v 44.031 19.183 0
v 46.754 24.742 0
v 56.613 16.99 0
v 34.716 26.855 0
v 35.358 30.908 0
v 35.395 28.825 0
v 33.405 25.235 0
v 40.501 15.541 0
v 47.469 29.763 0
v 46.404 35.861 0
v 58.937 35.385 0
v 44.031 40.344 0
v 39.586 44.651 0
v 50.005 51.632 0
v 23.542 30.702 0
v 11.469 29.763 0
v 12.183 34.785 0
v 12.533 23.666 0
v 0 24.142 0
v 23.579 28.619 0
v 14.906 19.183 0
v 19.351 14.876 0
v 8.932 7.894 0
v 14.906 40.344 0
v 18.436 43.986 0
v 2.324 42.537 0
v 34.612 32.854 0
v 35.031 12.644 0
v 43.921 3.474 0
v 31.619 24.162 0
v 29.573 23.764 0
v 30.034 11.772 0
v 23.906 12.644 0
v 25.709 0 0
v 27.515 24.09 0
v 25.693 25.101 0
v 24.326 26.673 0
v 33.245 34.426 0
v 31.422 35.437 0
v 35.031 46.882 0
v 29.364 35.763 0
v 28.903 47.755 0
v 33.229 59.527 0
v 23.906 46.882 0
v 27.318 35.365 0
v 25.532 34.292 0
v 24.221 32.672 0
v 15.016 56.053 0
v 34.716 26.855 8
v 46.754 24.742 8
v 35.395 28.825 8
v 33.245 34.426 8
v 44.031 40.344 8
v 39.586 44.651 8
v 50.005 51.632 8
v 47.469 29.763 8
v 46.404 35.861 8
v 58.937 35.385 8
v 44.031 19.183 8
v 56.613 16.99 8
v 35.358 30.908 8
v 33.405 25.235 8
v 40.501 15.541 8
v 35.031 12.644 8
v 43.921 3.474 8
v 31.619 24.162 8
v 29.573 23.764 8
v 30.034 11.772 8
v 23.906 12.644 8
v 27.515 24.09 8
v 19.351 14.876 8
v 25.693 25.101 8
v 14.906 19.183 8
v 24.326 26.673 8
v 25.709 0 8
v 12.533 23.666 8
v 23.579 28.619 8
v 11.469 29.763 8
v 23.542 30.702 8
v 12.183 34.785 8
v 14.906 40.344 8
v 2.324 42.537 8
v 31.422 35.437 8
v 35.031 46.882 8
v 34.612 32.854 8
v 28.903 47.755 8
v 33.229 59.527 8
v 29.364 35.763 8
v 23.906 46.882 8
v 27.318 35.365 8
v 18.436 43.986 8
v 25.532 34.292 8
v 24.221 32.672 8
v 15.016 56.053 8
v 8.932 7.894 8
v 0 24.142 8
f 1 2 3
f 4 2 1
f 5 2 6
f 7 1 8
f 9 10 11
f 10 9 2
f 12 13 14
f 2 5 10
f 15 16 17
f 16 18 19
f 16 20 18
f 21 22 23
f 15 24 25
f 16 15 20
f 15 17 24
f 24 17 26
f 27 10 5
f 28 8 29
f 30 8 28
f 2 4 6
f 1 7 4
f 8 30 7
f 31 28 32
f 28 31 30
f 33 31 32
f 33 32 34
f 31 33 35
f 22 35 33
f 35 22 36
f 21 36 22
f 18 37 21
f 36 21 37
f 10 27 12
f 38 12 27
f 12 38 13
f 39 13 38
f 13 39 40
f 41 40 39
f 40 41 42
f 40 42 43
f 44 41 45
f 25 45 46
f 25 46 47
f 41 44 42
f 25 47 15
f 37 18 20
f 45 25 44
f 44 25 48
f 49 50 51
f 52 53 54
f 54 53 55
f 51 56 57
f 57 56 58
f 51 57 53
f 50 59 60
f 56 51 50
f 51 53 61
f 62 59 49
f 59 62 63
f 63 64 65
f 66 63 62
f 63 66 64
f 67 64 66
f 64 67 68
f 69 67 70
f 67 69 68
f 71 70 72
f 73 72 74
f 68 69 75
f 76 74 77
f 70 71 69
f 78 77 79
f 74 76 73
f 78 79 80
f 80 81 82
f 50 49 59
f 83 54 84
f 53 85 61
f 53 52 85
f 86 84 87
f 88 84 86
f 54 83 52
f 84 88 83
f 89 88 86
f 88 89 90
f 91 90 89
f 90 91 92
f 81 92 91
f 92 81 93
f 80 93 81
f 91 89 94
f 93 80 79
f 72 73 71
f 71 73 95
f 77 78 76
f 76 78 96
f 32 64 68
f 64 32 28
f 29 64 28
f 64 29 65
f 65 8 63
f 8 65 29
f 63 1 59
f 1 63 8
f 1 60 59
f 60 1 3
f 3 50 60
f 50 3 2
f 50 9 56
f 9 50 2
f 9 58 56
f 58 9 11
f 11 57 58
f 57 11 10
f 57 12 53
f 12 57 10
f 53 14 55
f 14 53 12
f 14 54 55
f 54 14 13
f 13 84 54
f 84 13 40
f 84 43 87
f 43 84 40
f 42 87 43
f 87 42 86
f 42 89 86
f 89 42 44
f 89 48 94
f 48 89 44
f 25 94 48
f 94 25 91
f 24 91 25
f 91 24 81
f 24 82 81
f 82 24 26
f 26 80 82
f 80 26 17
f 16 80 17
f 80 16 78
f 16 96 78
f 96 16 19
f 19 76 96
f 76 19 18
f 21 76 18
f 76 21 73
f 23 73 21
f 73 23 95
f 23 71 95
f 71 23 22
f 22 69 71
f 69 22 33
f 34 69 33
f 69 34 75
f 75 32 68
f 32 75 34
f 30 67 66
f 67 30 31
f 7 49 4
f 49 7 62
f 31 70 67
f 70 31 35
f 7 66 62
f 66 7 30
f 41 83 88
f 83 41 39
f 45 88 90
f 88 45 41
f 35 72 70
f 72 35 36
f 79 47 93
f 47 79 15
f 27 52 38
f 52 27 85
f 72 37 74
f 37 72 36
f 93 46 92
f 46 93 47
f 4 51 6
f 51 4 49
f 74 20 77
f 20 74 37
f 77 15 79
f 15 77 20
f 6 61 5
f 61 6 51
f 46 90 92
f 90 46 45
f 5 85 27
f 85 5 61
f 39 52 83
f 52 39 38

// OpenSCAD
$fn = 32;

// ----------------------------------------------------------------------
// Star wheel: 10-point ratchet, R30
// ----------------------------------------------------------------------

// --- parameters (mm) ---
n_points = 10;            // number of points / teeth
r_out = 30;               // tip radius
r_in = 18;                // root radius
bore_r = 6;               // centre bore radius
plate_t = 8;              // plate thickness, Z (extrusion height)
bore_d = 12;              // centre bore diameter

profile = [[47.469, 29.763], [58.937, 35.385], [46.404, 35.861], [44.031, 40.344], [50.005, 51.632], [39.586, 44.651], [35.031, 46.882], [33.229, 59.527], [28.903, 47.755], [23.906, 46.882], [15.016, 56.053], [18.436, 43.986], [14.906, 40.344], [2.324, 42.537], [12.183, 34.785], [11.469, 29.763], [0, 24.142], [12.533, 23.666], [14.906, 19.183], [8.932, 7.894], [19.351, 14.876], [23.906, 12.644], [25.709, 0], [30.034, 11.772], [35.031, 12.644], [43.921, 3.474], [40.501, 15.541], [44.031, 19.183], [56.613, 16.99], [46.754, 24.742]];  // primary outline, 30 points, counter clockwise
void_1 = [[35.358, 30.908], [34.612, 32.854], [33.245, 34.426], [31.422, 35.437], [29.364, 35.763], [27.318, 35.365], [25.532, 34.292], [24.221, 32.672], [23.542, 30.702], [23.579, 28.619], [24.326, 26.673], [25.693, 25.101], [27.515, 24.09], [29.573, 23.764], [31.619, 24.162], [33.405, 25.235], [34.716, 26.855], [35.395, 28.825]];  // centre bore, 18 points

// --- the one profile operation ---
difference() {
  linear_extrude(height = plate_t) polygon(points = profile);
  translate([0, 0, -1])
    linear_extrude(height = plate_t + 2) polygon(points = void_1);
}
